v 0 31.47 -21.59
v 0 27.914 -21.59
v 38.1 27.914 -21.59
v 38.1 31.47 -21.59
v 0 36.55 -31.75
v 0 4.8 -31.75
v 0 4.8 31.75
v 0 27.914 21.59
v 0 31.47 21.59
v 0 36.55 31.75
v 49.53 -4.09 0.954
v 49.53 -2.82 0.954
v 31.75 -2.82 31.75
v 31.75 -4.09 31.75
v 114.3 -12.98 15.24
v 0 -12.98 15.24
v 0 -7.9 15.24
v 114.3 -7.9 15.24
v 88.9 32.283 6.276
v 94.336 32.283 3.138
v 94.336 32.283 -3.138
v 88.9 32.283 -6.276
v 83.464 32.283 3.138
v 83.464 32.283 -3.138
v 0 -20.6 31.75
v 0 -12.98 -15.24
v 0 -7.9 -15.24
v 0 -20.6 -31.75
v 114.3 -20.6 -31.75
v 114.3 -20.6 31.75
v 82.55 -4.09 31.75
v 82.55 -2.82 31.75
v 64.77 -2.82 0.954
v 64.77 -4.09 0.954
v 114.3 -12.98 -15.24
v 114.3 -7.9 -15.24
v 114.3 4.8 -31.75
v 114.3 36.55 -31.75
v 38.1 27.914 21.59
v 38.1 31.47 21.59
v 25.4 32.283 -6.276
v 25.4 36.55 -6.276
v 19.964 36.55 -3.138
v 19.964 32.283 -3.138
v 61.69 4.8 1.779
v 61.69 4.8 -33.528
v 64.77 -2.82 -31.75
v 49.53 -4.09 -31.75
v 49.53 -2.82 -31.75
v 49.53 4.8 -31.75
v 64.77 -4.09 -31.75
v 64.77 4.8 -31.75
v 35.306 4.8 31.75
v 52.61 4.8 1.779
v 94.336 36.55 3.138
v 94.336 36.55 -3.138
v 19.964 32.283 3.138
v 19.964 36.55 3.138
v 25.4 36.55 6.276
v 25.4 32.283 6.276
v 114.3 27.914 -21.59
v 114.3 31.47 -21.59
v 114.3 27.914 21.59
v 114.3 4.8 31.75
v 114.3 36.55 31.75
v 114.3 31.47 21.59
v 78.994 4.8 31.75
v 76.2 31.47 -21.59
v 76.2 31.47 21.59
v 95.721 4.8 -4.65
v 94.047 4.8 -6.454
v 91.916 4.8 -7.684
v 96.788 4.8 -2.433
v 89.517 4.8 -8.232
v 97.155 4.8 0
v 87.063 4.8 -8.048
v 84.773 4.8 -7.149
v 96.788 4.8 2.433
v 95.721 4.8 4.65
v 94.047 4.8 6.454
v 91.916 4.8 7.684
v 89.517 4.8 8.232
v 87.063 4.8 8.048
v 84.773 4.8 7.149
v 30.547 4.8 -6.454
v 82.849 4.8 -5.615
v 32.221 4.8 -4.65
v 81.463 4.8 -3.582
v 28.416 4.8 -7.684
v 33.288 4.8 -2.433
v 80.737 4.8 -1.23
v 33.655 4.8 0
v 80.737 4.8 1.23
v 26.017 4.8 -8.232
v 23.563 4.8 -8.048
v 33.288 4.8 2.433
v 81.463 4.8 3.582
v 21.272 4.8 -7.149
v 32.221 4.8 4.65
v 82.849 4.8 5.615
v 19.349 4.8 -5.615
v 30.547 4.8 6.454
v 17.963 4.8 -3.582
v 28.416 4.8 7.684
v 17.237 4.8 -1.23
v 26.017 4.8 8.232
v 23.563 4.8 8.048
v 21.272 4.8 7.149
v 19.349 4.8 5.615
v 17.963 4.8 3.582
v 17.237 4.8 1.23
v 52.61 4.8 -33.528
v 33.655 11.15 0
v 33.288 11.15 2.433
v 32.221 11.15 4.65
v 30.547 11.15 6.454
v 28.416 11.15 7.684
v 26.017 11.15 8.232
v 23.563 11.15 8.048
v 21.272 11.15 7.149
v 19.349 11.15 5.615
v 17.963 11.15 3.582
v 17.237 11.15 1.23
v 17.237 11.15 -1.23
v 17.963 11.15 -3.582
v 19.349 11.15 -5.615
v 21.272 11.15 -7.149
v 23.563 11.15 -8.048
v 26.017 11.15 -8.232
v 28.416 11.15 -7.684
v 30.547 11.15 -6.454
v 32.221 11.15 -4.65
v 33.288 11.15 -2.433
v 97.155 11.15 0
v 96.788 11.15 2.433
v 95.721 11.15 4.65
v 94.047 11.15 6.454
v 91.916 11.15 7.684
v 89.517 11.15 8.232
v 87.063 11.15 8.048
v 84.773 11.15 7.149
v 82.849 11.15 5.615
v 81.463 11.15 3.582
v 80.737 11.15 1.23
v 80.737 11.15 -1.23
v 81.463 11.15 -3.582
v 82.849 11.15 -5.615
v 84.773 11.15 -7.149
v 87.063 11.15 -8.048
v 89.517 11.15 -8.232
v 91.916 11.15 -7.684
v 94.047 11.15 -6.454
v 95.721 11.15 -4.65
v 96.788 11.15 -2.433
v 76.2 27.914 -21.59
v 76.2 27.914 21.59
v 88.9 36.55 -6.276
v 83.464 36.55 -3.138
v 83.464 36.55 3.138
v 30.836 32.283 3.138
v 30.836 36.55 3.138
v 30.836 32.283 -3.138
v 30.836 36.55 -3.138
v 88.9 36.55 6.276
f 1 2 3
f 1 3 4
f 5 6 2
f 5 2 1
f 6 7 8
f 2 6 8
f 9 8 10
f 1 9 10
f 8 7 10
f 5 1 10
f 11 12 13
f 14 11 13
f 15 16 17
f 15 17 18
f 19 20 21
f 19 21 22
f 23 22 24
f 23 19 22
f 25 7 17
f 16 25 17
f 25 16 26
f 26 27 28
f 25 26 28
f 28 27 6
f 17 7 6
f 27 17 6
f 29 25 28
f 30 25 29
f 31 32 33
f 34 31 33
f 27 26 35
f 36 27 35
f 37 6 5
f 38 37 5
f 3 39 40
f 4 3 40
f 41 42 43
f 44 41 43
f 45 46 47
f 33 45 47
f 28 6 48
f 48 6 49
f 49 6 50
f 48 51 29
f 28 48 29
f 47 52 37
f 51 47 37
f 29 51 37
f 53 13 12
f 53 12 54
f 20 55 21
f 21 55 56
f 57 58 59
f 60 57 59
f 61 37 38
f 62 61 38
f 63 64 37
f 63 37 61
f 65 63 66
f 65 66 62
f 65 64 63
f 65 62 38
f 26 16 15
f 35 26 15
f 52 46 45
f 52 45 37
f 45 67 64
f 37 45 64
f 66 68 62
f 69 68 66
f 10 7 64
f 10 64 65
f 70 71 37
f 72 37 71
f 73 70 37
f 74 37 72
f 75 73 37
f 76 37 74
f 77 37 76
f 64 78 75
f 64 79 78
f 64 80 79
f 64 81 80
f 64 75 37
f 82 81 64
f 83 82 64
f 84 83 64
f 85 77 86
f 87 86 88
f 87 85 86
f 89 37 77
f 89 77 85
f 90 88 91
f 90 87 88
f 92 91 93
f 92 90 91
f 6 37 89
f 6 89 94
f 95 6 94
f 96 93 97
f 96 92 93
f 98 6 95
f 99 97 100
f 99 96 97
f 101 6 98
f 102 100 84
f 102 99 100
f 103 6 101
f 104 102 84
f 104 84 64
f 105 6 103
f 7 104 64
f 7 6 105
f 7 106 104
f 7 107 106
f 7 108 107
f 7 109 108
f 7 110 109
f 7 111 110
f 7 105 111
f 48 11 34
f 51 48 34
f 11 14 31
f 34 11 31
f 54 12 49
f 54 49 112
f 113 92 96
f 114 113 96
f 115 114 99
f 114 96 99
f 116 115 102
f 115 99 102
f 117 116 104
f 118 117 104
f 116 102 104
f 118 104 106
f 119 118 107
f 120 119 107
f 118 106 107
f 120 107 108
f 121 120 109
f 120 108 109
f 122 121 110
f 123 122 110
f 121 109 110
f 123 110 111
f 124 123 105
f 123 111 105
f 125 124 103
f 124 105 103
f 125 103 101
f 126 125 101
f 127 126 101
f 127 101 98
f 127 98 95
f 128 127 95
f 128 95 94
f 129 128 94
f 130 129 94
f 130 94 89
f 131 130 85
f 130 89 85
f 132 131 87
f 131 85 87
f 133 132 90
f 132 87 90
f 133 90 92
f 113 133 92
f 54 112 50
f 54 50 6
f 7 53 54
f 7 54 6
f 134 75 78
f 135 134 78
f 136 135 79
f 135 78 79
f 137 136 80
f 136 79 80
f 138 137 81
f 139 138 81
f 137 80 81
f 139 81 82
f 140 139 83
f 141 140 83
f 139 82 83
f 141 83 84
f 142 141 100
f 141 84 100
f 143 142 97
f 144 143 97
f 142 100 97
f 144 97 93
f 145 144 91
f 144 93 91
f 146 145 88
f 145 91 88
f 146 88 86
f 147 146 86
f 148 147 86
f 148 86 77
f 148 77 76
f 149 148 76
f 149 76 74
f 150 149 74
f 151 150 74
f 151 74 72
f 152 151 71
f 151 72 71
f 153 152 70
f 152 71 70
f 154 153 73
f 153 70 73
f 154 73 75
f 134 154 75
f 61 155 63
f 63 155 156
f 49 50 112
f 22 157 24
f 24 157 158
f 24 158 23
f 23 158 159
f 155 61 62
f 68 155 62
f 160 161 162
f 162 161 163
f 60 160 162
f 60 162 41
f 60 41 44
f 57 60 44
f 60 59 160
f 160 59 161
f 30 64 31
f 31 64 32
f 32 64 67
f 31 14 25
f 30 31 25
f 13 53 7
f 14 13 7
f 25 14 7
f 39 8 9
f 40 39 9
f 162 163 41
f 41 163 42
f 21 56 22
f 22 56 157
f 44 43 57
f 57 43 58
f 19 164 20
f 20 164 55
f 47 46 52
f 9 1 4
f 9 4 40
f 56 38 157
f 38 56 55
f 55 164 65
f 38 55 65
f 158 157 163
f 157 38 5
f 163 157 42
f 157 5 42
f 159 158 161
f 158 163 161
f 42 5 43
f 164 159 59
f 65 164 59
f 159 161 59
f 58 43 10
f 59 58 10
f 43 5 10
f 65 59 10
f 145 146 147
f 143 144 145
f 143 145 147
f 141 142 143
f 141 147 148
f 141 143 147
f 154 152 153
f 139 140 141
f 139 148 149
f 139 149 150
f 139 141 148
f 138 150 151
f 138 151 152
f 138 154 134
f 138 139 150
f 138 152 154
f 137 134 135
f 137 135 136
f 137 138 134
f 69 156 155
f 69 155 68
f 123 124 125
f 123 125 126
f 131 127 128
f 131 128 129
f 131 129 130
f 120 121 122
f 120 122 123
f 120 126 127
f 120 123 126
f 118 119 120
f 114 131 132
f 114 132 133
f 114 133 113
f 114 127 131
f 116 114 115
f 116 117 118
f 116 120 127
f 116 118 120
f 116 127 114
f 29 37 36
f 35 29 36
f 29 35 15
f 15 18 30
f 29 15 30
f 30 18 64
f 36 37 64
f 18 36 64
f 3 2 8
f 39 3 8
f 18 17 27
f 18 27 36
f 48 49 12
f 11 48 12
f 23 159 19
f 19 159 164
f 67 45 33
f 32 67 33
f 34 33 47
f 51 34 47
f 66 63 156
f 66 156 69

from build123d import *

# Parameters (mm, degrees)
F0_W      = 31.75
F0_H      = 63.5
F1_DEPTH  = 114.3
F2_DEPTH  = 114.3
F5_W      = 3.556
F5_H      = 43.18
F6_DEPTH  = 38.1
F7_START  = 76.2
F7_DEPTH  = 38.1
F11_R     = 8.255
F12_R     = 8.255
F13_DEPTH = 6.35
F15_DEPTH = 4.2672
F16_DEPTH = 25.4
F17_START = 8.89
F17_DEPTH = 16.51
F20_START = -7.62
F19_W     = 114.3
F19_H     = 30.48
F20_DEPTH = 5.08


with BuildPart() as f1:
    # F0 (on Right) → F1 (new body)
    with BuildSketch(Plane.YZ):
        with Locations((20.6751725854, 0)):
            Rectangle(F0_W, F0_H)
    extrude(amount=F1_DEPTH)

    # F5 (on face) → F6 (cut)
    with BuildSketch(Plane.YZ):
        with Locations((29.6921725854, 0)):
            Rectangle(F5_W, F5_H)
    extrude(amount=F6_DEPTH, mode=Mode.SUBTRACT)

    # F5 (on face) → F7 (cut)
    with BuildSketch(Plane.YZ.offset(F7_START)):
        with Locations((29.6921725854, 0)):
            Rectangle(F5_W, F5_H)
    extrude(amount=F7_DEPTH, mode=Mode.SUBTRACT)

    # F11 (on face) + F12 (on face) → F13 (cut)
    with BuildSketch(Plane.XZ.offset(-4.8001725854)):
        with Locations((25.4, 0)):
            Circle(F11_R)
    with BuildSketch(Plane.XZ.offset(-4.8001725854)):
        with Locations((88.9, 0)):
            Circle(F12_R)
    extrude(amount=-F13_DEPTH, mode=Mode.SUBTRACT)

    # F14 (on face) → F15 (cut)
    with BuildSketch(Plane(origin=(0, 36.5501725854, 0), x_dir=(-1, 0, 0), z_dir=(0, 1, 0))):
        Polygon((-83.4644, -3.1382451232), (-83.4644, 3.1382451232), (-88.9, 6.2764902464), (-94.3356, 3.1382451232), (-94.3356, -3.1382451232), (-88.9, -6.2764902464), align=None)
        Polygon((-30.8356, 3.1382451232), (-30.8356, -3.1382451232), (-25.4, -6.2764902464), (-19.9644, -3.1382451232), (-19.9644, 3.1382451232), (-25.4, 6.2764902464), align=None)
    extrude(amount=-F15_DEPTH, mode=Mode.SUBTRACT)


with BuildPart() as f2:
    # F0 (on Right) → F2 (new body)
    with BuildSketch(Plane.YZ):
        Polygon((-26.9498274146, -19.685), (-26.9498274146, -31.75), (4.8001725854, -31.75), (4.8001725854, 31.75), (-26.9498274146, 31.75), (-26.9498274146, 19.685), (-23.3938274146, 19.685), (-7.8998274146, 8.89), (-7.8998274146, -8.89), (-23.3938274146, -19.685), align=None)
        Polygon((-26.9498274146, 19.685), (-26.9498274146, -19.685), (-23.3938274146, -19.685), (-7.8998274146, -8.89), (-7.8998274146, 8.89), (-23.3938274146, 19.685), align=None)
    extrude(amount=F2_DEPTH)


with BuildPart() as f9:
    # F9: sweep along a path in F4
    with BuildLine(Plane.XZ.offset(-4.8001725854)) as f9_path:
        Line((49.53, -31.75), (49.53, 0.9541366414))
        Line((49.53, 0.9541366414), (31.75, 31.75))
    # F8 (on face) → F9 (sweep)
    with BuildSketch(Plane.XY.offset(31.75)):
        Polygon((35.306, 4.8001725854), (31.75, 4.8001725854), (31.75, -2.8198274146), align=None)
    sweep(path=f9_path.line, transition=Transition.RIGHT)


with BuildPart() as f10:
    # F10: sweep along a path in F4
    with BuildLine(Plane.XZ.offset(-4.8001725854)) as f10_path:
        Line((82.55, 31.75), (64.77, 0.9541366414))
        Line((64.77, 0.9541366414), (64.77, -31.75))
    # F8 (on face) → F10 (sweep)
    with BuildSketch(Plane.XY.offset(31.75)):
        Polygon((82.55, -2.8198274146), (82.55, 4.8001725854), (78.994, 4.8001725854), align=None)
    sweep(path=f10_path.line, transition=Transition.RIGHT)


with BuildPart() as f16:
    # F4 (on face) → F16 (new body)
    with BuildSketch(Plane.XZ.offset(-4.8001725854)):
        Polygon((49.53, 0.9541366414), (31.75, 31.75), (0, 31.75), (0, -31.75), (49.53, -31.75), align=None)
    extrude(amount=F16_DEPTH)


with BuildPart() as f16b:
    # F4 (on face) → F16, piece 2 (new body)
    with BuildSketch(Plane.XZ.offset(-4.8001725854)):
        Polygon((114.3, 31.75), (82.55, 31.75), (64.77, 0.9541366414), (64.77, -31.75), (114.3, -31.75), align=None)
    extrude(amount=F16_DEPTH)


with BuildPart() as f17:
    # F4 (on face) → F17 (new body)
    with BuildSketch(Plane.XZ.offset(-4.8001725854).offset(F17_START)):
        Polygon((57.15, -31.75), (57.15, 31.75), (31.75, 31.75), (49.53, 0.9541366414), (49.53, -31.75), align=None)
        Polygon((82.55, 31.75), (57.15, 31.75), (57.15, -31.75), (64.77, -31.75), (64.77, 0.9541366414), align=None)
    extrude(amount=F17_DEPTH)


with BuildPart() as f9_1:
    add(f9.part)

    # F18: union F10, F16, F16b, F17
    add(f10.part)
    add(f16.part)
    add(f16b.part)
    add(f17.part)

    # F19 (on face) → F20 (cut)
    with BuildSketch(Plane.XZ.offset(20.5998274146).offset(F20_START)):
        with Locations((57.15, 0)):
            Rectangle(F19_W, F19_H)
    extrude(amount=-F20_DEPTH, mode=Mode.SUBTRACT)


solid = Compound([f1.part, f9_1.part])
